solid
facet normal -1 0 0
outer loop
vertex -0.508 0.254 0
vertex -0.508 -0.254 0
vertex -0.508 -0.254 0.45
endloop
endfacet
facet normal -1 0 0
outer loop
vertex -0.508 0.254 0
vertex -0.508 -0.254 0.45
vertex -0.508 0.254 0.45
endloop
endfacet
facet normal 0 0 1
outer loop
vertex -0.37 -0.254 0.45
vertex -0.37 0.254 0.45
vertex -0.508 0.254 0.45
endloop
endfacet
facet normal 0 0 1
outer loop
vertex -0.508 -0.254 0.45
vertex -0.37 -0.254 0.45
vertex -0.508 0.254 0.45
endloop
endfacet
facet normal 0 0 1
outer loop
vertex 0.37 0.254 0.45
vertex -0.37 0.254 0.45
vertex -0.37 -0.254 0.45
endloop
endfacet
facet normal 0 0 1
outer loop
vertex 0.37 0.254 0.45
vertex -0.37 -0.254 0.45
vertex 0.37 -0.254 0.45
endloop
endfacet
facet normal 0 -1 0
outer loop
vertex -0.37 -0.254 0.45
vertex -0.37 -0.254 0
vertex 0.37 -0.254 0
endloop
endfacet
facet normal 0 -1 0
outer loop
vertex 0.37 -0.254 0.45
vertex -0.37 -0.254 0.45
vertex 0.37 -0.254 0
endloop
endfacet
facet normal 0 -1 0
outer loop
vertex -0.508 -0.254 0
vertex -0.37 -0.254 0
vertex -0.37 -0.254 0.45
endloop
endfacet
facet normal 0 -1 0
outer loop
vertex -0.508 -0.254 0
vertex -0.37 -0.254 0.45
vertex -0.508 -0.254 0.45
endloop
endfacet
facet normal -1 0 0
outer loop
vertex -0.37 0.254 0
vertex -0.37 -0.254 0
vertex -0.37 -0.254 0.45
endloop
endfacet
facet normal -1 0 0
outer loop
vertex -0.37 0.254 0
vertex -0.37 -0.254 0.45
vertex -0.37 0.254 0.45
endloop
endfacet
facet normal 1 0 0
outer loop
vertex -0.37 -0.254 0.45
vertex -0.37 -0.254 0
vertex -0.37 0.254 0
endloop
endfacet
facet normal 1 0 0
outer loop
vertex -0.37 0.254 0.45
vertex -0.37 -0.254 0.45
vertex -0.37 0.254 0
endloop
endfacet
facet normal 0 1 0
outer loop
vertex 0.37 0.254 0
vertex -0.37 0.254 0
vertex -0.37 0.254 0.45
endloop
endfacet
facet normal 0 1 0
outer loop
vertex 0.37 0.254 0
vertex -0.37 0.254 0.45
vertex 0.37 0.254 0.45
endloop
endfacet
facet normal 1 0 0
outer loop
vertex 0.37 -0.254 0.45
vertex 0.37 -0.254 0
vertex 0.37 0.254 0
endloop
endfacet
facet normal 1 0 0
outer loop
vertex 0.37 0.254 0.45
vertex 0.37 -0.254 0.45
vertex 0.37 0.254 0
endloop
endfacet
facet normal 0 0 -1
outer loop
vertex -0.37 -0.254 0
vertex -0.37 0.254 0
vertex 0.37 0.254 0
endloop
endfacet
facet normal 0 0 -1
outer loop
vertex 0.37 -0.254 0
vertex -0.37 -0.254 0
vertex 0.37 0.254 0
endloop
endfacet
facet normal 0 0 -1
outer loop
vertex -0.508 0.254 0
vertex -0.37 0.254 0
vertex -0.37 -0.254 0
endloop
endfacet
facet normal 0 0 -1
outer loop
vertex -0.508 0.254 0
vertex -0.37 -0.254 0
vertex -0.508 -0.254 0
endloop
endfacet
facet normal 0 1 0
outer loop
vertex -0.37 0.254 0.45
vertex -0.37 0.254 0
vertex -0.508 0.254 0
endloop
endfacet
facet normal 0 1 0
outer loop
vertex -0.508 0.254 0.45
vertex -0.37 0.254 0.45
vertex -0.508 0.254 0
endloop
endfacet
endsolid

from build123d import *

# Parameters (mm, degrees)
SKETCH_W     = 0.74
SKETCH_H     = 0.508
PAD_DEPTH    = 0.45
SKETCH001_W  = 0.138
SKETCH001_H  = 0.508
PAD001_DEPTH = 0.45


with BuildPart() as body:
    # Sketch → Pad (new body)
    with BuildSketch(Plane.XY):
        Rectangle(SKETCH_W, SKETCH_H)
    extrude(amount=PAD_DEPTH)


with BuildPart() as body001:
    # Sketch001 → Pad001 (new body)
    with BuildSketch(Plane.XY):
        with Locations((0.439, 0)):
            Rectangle(SKETCH001_W, SKETCH001_H)
    extrude(amount=PAD001_DEPTH)


with BuildPart() as part_mirroring:
    # Part__Mirroring: instance of Body001
    add(body001.part.mirror(Plane(origin=(0, 0, 0), x_dir=(0, -1, 0), z_dir=(1, 0, 0))))


solid = Compound([body.part, part_mirroring.part])
